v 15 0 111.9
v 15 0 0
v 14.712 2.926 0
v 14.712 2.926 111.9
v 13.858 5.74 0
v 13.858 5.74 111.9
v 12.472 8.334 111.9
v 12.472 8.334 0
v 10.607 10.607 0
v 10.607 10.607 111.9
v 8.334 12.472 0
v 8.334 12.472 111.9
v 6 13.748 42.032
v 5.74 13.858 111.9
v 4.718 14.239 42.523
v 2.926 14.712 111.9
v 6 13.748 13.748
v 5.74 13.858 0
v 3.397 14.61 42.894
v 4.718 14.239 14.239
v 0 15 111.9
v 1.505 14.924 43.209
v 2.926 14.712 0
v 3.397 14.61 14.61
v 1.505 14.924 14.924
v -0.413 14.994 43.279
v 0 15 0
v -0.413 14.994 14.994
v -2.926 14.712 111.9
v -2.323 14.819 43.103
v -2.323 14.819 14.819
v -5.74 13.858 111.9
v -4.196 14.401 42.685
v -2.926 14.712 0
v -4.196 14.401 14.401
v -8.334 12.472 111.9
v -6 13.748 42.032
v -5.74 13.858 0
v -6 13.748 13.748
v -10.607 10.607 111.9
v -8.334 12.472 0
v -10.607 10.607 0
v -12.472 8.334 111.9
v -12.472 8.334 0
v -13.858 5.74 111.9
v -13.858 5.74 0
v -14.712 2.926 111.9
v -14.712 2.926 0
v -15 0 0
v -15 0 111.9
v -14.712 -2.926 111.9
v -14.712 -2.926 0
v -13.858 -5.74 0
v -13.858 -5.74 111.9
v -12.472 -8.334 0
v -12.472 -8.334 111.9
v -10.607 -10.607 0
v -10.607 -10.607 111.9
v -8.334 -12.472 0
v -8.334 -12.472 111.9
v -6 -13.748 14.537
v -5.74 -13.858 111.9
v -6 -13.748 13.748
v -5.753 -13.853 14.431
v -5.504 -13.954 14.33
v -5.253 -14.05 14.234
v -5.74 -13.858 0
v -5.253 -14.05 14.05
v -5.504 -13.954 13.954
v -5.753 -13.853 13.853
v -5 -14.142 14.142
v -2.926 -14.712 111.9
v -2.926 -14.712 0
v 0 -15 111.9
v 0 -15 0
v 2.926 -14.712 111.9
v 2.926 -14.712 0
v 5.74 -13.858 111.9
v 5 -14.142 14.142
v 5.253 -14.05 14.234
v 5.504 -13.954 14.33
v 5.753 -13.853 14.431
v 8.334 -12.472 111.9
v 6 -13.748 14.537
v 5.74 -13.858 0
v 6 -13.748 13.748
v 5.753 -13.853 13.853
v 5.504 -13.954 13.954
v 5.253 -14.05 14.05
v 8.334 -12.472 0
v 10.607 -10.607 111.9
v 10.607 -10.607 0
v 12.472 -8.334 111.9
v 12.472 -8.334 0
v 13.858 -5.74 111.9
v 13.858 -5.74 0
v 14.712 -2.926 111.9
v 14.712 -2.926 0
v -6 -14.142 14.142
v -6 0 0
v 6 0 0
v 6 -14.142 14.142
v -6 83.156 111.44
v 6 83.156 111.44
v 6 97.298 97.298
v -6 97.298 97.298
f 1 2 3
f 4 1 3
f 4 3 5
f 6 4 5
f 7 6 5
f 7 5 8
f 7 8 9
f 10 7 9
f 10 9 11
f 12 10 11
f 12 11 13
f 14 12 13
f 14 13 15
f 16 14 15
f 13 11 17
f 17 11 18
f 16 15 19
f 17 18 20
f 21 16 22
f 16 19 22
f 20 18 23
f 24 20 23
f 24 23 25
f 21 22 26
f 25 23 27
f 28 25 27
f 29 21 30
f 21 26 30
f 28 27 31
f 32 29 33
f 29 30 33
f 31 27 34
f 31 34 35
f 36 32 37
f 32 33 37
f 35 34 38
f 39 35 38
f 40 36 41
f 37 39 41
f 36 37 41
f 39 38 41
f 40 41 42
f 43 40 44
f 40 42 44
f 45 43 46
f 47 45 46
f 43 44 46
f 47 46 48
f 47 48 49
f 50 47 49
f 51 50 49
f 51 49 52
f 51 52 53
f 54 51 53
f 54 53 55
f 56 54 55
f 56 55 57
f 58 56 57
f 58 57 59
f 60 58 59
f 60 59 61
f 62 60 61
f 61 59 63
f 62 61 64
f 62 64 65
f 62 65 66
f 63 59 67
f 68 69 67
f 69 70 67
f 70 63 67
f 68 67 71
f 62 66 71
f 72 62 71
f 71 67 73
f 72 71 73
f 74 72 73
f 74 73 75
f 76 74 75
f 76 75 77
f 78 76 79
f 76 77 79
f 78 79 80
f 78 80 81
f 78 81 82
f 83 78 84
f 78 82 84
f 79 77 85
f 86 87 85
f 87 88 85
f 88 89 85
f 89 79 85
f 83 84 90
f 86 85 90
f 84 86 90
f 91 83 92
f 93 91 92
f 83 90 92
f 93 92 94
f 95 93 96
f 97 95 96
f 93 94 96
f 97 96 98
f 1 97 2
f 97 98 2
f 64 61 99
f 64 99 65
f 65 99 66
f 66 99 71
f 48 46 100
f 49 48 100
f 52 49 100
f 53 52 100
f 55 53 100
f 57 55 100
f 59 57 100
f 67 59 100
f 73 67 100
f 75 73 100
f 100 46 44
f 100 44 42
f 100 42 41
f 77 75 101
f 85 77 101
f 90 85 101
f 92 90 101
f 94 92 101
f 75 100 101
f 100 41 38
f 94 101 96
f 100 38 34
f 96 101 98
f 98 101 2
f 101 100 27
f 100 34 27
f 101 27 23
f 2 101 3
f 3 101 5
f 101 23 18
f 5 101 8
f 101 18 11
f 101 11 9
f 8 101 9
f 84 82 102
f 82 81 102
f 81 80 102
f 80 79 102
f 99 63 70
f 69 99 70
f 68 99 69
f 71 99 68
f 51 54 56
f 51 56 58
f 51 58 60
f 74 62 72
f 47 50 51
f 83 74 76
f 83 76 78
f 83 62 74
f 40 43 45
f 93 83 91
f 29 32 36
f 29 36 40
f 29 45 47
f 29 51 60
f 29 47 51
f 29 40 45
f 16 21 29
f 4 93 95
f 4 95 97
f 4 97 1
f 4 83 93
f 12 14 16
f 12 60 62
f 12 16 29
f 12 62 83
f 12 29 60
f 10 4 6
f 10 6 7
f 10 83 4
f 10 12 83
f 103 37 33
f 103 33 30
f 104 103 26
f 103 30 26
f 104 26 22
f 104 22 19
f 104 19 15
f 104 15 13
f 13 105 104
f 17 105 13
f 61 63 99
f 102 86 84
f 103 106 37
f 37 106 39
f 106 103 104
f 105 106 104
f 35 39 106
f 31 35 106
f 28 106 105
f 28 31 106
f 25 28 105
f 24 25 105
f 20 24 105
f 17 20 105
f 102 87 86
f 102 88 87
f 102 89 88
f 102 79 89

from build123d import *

# Parameters (mm, degrees)
F0_R     = 15
F1_DEPTH = 111.9
F3_W     = 12
F3_H     = 20
F4_DEPTH = 137.6


with BuildPart() as f1:
    # F0 (on Top) → F1 (new body)
    with BuildSketch(Plane.XY):
        Circle(F0_R)
    extrude(amount=F1_DEPTH)

    # F3 (on face) → F4 (join)
    with BuildSketch(Plane(origin=(0, 0, 0), x_dir=(1, 0, 0), z_dir=(0, -0.7071067812, -0.7071067812))):
        with Locations((0, 10)):
            Rectangle(F3_W, F3_H)
    extrude(amount=-F4_DEPTH)


solid = f1.part
